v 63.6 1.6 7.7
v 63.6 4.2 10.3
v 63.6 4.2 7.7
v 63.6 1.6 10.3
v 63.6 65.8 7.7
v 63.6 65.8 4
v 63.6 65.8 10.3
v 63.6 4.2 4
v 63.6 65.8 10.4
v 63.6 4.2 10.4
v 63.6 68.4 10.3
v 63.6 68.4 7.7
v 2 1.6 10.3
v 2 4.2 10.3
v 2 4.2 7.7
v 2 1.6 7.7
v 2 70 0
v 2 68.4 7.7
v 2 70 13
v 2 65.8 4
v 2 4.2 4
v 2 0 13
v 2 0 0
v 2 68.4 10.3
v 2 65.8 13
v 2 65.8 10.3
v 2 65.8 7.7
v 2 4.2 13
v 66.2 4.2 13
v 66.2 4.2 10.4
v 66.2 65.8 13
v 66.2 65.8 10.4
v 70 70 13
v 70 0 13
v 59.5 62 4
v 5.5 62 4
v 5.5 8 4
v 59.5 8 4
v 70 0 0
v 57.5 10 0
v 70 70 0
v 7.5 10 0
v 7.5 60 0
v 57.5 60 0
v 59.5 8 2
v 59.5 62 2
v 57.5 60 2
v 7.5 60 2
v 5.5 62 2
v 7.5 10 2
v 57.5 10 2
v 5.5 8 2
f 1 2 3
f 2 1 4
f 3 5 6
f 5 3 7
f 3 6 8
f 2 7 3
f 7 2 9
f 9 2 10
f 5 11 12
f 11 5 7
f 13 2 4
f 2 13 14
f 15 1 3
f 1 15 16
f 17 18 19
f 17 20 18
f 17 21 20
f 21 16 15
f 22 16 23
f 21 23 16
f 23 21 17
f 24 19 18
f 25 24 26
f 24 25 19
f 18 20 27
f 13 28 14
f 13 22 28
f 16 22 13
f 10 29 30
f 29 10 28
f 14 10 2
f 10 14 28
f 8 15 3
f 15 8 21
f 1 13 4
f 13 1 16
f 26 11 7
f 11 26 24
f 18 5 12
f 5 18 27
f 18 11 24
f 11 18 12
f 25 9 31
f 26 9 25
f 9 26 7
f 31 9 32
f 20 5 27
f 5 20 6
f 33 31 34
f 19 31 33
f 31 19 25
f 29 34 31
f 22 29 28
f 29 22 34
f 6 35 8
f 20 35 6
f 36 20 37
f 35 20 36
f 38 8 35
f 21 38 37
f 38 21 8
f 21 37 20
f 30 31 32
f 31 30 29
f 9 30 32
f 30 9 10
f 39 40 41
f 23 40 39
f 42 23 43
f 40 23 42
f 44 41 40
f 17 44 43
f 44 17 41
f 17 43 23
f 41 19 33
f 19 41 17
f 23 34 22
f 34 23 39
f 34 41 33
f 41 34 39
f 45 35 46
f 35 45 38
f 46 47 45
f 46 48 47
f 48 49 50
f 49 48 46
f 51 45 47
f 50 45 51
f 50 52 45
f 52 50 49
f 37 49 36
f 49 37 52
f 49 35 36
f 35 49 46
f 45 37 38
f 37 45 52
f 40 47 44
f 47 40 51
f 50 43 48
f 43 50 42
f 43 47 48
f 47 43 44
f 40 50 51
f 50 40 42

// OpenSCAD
// file: variables.scad
// ajmaker.pl oferuje dokładność 0.6 mm.
print_tolerance = 0.6; // mm

// 2 mm   - płyta kompozytowa
// 1.6 mm - szyba (http://szlachetnafotografia.com/kategoria/ambrotyp-kolodion/szybki-do-kolodionu-13x18cm)
photo_plate_height = 2 + print_tolerance;
photo_plate_width = 50;

// E-Mount flange distance. Distance between rear part
// of the lens mount on the lens (or front part of the lens 
// mount on the body) and the front of the photo plate.
e_mount_flange_distance = 18;

// Height of the circle lens mount.
lens_mount_height = 9; // mm

// Diameter of the circle lens mount.
lens_mount_width = 61;

// Width (along x axis) of the back (side) wall.
back_wall_width = 2;

outer_box_size = [70, 70, 13];

inner_box_size = [lens_mount_width,
                  lens_mount_width,
                  e_mount_flange_distance - lens_mount_height];

// Offset in relation to the outer box.
inner_box_offset = [back_wall_width,
                    (outer_box_size[1] - lens_mount_width) / 2,
                    outer_box_size[2]];
// file: shared.scad
include <variables.scad>;


//tripod_mount_file = "Easy 35 B2 Body.stl";

module SlideInRails(print_tolerance) {
    rail_width = 2;
    rail_height = 2;
    rail_distance_from_edge = - rail_height - 3;
    
    color("red")
    translate([0,
               0,
               rail_distance_from_edge - print_tolerance / 2]) {
        translate([0, -rail_width - print_tolerance, 0])
            cube(size=[lens_mount_width + print_tolerance,
                       rail_width + print_tolerance,
                       rail_height + print_tolerance]);
        translate([0, lens_mount_width + print_tolerance, 0])
            cube(size=[lens_mount_width + print_tolerance,
                       rail_width + print_tolerance,
                       rail_height + print_tolerance]);
    }
}

module BackWall() {
    color("black")
    translate([0,
               0,
               0])
        cube(size=[back_wall_width,
                   outer_box_size[1],
                   outer_box_size[2]]);
};

module LightCoverX(print_tolerance) {
    color("blue")
    translate([lens_mount_width + print_tolerance,
               0,
               - 2 - print_tolerance])
        cube(size=[2 + print_tolerance,
                   lens_mount_width + print_tolerance,
                   2 + print_tolerance]);
};


module CameraFrontWithoutLensMount(print_tolerance) {    
    difference() {
        union() {
            BackWall();
            
            translate(inner_box_offset - [0, print_tolerance / 2, 0]) {
                translate([0, 0, - inner_box_size[2]])
                    cube(size=inner_box_size
                              + [print_tolerance,
                                 print_tolerance,
                                 // No print tolerance on Z axis, because
                                 // one has already been applied on rails.
                                 // Doubling it on Z axis is dangerous
                                 // as could affect flange distance.
                                 0]);
                SlideInRails(print_tolerance);
                LightCoverX(print_tolerance);
            };
        }
    }
}

rear_lens_cap_file = "E-mount_rear_lenscap.STL";

module CameraFront() {
    difference() {
        union() {
            CameraFrontWithoutLensMount(0);
            
            // Height is ~ 9,00 mm.
            translate(inner_box_offset)
                 import(rear_lens_cap_file);
        }
        
        translate(inner_box_offset
                   + [lens_mount_width / 2,
                      lens_mount_width / 2,
                      0]) {
            cylinder(r1 = 21.5, r2 = 21.5, h = 4);
            translate([0, 0, -10]) 
                cylinder(r1 = 30, r2 = 22, h = 10);
        }
    }
}

module CameraBack() {
    difference() {        
        cube(size=outer_box_size);
        CameraFrontWithoutLensMount(print_tolerance);
    };
}

module CenteredOnBack(size) {
    translate(inner_box_offset + [(lens_mount_width - size) / 2,
                                  (lens_mount_width - size) / 2,
                                  -inner_box_size[2] - 2]) {
        children();
    }
}
// main file
include <shared.scad>;

difference() {
    CameraBack();
    
    focusing_screen_width = photo_plate_width + 4;
    CenteredOnBack(focusing_screen_width) {
        cube(size=[focusing_screen_width,
                   focusing_screen_width,
                   photo_plate_height]);
    }
    
    CenteredOnBack(photo_plate_width) {
        translate([0, 0, -10])
            cube(size=[photo_plate_width,
                       photo_plate_width,
                       10]);
    }
}
